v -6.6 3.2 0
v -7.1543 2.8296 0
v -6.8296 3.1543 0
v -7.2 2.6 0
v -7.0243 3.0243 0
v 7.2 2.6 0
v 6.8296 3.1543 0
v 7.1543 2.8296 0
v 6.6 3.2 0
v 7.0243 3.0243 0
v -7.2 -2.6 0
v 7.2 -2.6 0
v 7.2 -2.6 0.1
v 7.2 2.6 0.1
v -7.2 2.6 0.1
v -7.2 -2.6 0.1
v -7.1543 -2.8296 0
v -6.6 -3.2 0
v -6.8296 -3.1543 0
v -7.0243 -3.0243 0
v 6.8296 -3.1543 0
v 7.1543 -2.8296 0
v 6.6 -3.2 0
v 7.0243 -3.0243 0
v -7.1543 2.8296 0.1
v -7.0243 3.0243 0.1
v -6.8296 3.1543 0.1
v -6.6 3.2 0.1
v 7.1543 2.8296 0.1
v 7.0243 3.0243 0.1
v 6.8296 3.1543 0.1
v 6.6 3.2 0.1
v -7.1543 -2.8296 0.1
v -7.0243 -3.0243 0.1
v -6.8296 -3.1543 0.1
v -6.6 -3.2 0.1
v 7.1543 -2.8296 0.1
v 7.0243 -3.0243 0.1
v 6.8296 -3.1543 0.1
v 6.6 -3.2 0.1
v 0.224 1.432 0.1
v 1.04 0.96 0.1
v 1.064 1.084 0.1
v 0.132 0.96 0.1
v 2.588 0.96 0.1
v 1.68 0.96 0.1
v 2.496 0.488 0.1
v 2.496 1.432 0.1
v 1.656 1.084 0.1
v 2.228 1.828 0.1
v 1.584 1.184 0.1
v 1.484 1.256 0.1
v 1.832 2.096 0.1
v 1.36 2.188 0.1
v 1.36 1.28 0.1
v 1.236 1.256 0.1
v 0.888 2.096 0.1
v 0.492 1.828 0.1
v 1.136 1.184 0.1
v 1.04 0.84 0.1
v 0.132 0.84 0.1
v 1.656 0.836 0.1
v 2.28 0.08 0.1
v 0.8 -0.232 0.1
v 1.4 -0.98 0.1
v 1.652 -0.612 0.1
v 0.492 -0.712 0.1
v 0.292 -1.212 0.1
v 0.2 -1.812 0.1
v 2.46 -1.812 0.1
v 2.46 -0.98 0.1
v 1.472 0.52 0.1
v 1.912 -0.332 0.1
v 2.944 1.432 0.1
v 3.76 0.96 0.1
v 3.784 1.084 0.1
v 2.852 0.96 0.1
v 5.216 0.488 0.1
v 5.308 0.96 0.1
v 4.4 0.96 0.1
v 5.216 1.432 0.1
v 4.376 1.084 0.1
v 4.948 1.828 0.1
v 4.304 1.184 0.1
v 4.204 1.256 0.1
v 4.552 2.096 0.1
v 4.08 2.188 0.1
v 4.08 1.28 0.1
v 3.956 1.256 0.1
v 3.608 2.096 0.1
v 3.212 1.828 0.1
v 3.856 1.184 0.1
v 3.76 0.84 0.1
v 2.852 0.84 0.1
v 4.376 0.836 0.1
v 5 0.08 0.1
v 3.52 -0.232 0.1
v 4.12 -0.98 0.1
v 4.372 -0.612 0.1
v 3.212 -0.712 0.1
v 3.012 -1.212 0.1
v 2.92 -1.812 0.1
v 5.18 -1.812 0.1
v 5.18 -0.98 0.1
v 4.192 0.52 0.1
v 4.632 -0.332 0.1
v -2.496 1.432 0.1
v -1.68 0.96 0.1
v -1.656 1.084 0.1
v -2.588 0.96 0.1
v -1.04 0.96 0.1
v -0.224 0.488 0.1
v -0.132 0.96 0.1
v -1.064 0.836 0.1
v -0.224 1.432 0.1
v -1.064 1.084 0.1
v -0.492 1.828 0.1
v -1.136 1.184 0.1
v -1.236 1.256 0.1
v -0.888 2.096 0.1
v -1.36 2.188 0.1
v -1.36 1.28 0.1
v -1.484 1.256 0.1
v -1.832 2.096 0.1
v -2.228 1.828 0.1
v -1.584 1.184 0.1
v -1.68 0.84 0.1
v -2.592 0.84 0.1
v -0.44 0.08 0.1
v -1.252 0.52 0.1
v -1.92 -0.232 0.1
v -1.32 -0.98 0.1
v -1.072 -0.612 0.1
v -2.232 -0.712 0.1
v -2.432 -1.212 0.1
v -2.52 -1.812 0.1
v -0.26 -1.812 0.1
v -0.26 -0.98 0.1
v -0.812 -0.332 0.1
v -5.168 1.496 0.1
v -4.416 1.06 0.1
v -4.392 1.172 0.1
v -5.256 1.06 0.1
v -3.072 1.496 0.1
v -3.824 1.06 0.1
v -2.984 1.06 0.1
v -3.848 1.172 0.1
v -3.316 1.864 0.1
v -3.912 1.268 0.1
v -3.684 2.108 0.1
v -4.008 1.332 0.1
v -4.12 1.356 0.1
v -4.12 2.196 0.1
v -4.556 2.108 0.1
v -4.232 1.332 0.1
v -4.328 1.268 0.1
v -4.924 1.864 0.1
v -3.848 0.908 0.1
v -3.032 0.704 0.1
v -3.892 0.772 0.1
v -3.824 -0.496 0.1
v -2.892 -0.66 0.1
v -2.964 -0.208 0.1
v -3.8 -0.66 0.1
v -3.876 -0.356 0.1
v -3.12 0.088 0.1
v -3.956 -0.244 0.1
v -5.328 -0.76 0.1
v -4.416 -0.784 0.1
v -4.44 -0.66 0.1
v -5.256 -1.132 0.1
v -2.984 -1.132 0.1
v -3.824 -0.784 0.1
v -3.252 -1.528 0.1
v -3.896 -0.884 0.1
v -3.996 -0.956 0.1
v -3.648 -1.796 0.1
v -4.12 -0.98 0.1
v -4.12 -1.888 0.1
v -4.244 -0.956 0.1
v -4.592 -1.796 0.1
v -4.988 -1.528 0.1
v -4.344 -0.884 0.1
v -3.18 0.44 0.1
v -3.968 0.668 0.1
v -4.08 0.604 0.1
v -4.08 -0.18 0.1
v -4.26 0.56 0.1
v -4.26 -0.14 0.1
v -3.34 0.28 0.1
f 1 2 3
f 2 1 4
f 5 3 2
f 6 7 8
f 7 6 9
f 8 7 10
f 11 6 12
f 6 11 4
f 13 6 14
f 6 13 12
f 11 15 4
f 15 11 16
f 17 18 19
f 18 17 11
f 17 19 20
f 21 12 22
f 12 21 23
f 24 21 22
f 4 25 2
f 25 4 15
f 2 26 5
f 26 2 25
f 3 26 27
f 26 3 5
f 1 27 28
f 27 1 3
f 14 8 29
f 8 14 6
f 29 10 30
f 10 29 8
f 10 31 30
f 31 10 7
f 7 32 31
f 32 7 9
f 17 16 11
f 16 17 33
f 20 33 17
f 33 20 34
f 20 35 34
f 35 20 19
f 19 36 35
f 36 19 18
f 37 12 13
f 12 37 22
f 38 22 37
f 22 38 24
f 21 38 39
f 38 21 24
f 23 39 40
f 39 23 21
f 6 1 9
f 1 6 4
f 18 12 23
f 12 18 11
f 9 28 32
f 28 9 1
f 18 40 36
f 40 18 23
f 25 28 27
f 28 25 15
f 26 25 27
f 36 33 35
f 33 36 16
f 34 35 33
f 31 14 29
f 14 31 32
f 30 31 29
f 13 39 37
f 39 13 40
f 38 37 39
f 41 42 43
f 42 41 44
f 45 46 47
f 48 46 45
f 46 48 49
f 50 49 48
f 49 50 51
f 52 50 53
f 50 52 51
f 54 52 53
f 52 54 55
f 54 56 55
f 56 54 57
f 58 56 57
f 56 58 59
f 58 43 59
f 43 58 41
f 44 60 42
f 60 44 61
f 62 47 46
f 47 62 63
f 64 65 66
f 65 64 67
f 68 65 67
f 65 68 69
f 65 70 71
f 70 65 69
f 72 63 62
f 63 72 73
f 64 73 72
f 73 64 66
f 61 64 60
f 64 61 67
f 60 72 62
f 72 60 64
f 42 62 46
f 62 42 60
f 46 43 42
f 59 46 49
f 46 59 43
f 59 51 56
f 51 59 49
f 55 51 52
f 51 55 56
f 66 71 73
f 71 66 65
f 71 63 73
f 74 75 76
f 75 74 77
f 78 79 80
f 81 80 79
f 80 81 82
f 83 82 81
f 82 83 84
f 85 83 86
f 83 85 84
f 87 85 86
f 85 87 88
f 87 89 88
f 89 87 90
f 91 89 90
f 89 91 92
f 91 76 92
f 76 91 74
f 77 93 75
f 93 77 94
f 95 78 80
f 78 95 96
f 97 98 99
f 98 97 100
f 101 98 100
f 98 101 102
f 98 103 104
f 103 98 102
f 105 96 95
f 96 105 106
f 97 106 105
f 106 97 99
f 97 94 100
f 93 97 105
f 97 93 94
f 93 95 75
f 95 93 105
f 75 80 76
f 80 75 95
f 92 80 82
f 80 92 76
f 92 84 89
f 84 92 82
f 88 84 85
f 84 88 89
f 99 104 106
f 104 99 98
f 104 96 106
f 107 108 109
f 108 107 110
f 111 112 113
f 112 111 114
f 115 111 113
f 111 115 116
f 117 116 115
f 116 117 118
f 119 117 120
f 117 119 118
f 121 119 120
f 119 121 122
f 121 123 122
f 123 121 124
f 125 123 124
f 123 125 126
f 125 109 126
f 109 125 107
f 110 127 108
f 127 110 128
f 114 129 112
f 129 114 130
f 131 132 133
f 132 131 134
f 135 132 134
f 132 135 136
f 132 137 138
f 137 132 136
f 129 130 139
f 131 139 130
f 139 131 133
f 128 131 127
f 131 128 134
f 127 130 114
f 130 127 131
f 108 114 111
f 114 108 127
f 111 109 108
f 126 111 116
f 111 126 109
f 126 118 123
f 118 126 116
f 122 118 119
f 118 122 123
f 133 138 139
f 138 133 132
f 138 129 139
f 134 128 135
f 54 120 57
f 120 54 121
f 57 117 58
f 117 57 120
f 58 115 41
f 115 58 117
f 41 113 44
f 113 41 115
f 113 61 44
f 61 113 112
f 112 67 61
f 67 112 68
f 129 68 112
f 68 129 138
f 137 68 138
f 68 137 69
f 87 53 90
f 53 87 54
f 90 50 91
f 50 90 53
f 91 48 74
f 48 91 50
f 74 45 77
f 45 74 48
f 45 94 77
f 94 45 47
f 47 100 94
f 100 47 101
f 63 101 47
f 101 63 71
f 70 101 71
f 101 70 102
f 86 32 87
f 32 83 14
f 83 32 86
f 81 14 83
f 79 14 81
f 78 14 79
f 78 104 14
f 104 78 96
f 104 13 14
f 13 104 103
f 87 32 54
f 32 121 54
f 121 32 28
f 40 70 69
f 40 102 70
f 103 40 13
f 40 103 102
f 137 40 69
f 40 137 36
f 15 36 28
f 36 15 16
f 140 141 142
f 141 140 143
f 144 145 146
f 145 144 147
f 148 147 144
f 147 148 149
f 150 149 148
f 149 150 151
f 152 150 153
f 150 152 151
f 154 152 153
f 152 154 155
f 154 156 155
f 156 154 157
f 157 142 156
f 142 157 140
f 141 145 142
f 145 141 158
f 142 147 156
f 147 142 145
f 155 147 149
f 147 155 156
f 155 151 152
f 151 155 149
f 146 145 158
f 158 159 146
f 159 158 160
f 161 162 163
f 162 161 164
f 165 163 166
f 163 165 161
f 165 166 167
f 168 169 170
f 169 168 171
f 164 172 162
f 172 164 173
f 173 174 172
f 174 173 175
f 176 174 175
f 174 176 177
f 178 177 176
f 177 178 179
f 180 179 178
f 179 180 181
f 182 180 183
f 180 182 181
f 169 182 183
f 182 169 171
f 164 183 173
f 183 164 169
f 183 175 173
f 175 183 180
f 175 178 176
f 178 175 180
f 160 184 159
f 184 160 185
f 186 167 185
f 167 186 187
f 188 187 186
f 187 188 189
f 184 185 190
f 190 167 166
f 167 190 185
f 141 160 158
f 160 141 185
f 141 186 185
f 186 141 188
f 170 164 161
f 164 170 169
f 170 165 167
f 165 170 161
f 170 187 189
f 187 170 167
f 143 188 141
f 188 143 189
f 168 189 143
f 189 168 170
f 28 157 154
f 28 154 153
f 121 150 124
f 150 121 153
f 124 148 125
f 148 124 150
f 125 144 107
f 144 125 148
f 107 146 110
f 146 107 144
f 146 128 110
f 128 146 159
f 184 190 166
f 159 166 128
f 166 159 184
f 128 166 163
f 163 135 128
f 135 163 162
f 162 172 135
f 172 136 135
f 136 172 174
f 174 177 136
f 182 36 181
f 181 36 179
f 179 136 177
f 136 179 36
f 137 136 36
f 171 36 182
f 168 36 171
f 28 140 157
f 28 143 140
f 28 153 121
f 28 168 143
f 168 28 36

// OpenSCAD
// file: ../p/box3u12.scad
use <../lib.scad>
function ldraw_lib__box3u12() = [
// 0 Box with 3 Parallel Faces without Any Edges
// 0 Name: box3u12.dat
// 0 Author: J.C. Tchang [tchang]
// 0 !LDRAW_ORG Primitive UPDATE 2014-02
// 0 !LICENSE Licensed under CC BY 4.0 : see CAreadme.txt
// 
// 0 BFC CERTIFY CCW
  [0,"BFC","CERTIFY"],
  [0,"BFC","CCW"],
// 
// 0 !HISTORY 2014-12-23 [PTadmin] Official Update 2014-02
// 
// 
// 4 16 -1 1 1 1 1 1 1 1 -1 -1 1 -1
  [4,16,-1,1,1,1,1,1,1,1,-1,-1,1,-1],
// 4 16 -1 1 1 -1 0 1 1 0 1 1 1 1
  [4,16,-1,1,1,-1,0,1,1,0,1,1,1,1],
// 4 16 1 1 -1 1 0 -1 -1 0 -1 -1 1 -1
  [4,16,1,1,-1,1,0,-1,-1,0,-1,-1,1,-1],
];
module ldraw_lib__box3u12(step=0, col=false, unit=2/5, alt=false, line=0.2, solid=!$preview)
    makepoly(ldraw_lib__box3u12(), step=step, col=col, unit=unit, alt=alt, line=line, solid=solid);
ldraw_lib__box3u12(line=0.2);
// file: ../p/1-4cyli.scad
use <../lib.scad>
function ldraw_lib__1_4cyli() = [
// 0 Cylinder 0.25
// 0 Name: 1-4cyli.dat
// 0 Author: James Jessiman
// 0 !LDRAW_ORG Primitive UPDATE 2012-01
// 0 !LICENSE Licensed under CC BY 4.0 : see CAreadme.txt
// 
// 0 BFC CERTIFY CCW
  [0,"BFC","CERTIFY"],
  [0,"BFC","CCW"],
// 
// 0 !HISTORY 2002-03-23 [sbliss] Added BFC statement.
// 0 !HISTORY 2002-04-25 [PTadmin] Official Update 2002-02
// 0 !HISTORY 2007-06-22 [PTadmin] Header formatted for Contributor Agreement
// 0 !HISTORY 2008-07-01 [PTadmin] Official Update 2008-01
// 0 !HISTORY 2012-02-16 [Philo] Changed to CCW
// 0 !HISTORY 2012-03-30 [PTadmin] Official Update 2012-01
// 
// 
// 4 16 1 1 0 0.9239 1 0.3827 0.9239 0 0.3827 1 0 0
  [4,16,1,1,0,0.9239,1,0.3827,0.9239,0,0.3827,1,0,0],
// 5 24 1 0 0 1 1 0 0.9239 0 0.3827 1 0 -1
  [5,24,1,0,0,1,1,0,0.9239,0,0.3827,1,0,-1],
// 4 16 0.9239 1 0.3827 0.7071 1 0.7071 0.7071 0 0.7071 0.9239 0 0.3827
  [4,16,0.9239,1,0.3827,0.7071,1,0.7071,0.7071,0,0.7071,0.9239,0,0.3827],
// 5 24 0.9239 0 0.3827 0.9239 1 0.3827 0.7071 0 0.7071 1 0 0
  [5,24,0.9239,0,0.3827,0.9239,1,0.3827,0.7071,0,0.7071,1,0,0],
// 4 16 0.7071 1 0.7071 0.3827 1 0.9239 0.3827 0 0.9239 0.7071 0 0.7071
  [4,16,0.7071,1,0.7071,0.3827,1,0.9239,0.3827,0,0.9239,0.7071,0,0.7071],
// 5 24 0.7071 0 0.7071 0.7071 1 0.7071 0.3827 0 0.9239 0.9239 0 0.3827
  [5,24,0.7071,0,0.7071,0.7071,1,0.7071,0.3827,0,0.9239,0.9239,0,0.3827],
// 4 16 0.3827 1 0.9239 0 1 1 0 0 1 0.3827 0 0.9239
  [4,16,0.3827,1,0.9239,0,1,1,0,0,1,0.3827,0,0.9239],
// 5 24 0.3827 0 0.9239 0.3827 1 0.9239 0 0 1 0.7071 0 0.7071
  [5,24,0.3827,0,0.9239,0.3827,1,0.9239,0,0,1,0.7071,0,0.7071],
// 5 24 0 0 1 0 1 1 0.3827 0 0.9239 -1 0 1
  [5,24,0,0,1,0,1,1,0.3827,0,0.9239,-1,0,1],
];
module ldraw_lib__1_4cyli(step=0, col=false, unit=2/5, alt=false, line=0.2, solid=!$preview)
    makepoly(ldraw_lib__1_4cyli(), step=step, col=col, unit=unit, alt=alt, line=line, solid=solid);
ldraw_lib__1_4cyli(line=0.2);
// file: s/stickerback008x018.scad
use <../../lib.scad>
use <../../p/1-4chrd.scad>
use <../../p/1-4cyli.scad>
use <../../p/box3u12.scad>
function ldraw_lib__s__stickerback008x018() = [
// 0 ~Sticker Back  0.8 x  1.8
// 0 Name: s\stickerback008x018.dat
// 0 Author: Massimo Maso [Sirio]
// 0 !LDRAW_ORG Subpart UPDATE 2025-08
// 0 !LICENSE Licensed under CC BY 4.0 : see CAreadme.txt
// 
// 0 BFC CERTIFY CCW
  [0,"BFC","CERTIFY"],
  [0,"BFC","CCW"],
// 
// 0 !HISTORY 2025-08-31 [OrionP] Official Update 2025-08
// 
// 0 // Primitives
// 1 16 -16.5 0 6.5 -1.5 0 0 0 -1 0 0 0 1.5 1-4chrd.dat
  [1,16,-16.5,0,6.5,-1.5,0,0,0,-1,0,0,0,1.5, ldraw_lib__1_4chrd()],
// 1 16 16.5 0 6.5 1.5 0 0 0 -1 0 0 0 1.5 1-4chrd.dat
  [1,16,16.5,0,6.5,1.5,0,0,0,-1,0,0,0,1.5, ldraw_lib__1_4chrd()],
// 1 16 0 -.25 0 0 0 18 0 .25 0 6.5 0 0 box3u12.dat
  [1,16,0,-.25,0,0,0,18,0,.25,0,6.5,0,0, ldraw_lib__box3u12()],
// 1 16 -16.5 0 -6.5 -1.5 0 0 0 -1 0 0 0 -1.5 1-4chrd.dat
  [1,16,-16.5,0,-6.5,-1.5,0,0,0,-1,0,0,0,-1.5, ldraw_lib__1_4chrd()],
// 1 16 16.5 0 -6.5 1.5 0 0 0 -1 0 0 0 -1.5 1-4chrd.dat
  [1,16,16.5,0,-6.5,1.5,0,0,0,-1,0,0,0,-1.5, ldraw_lib__1_4chrd()],
// 1 16 -16.5 0 6.5 -1.5 0 0 0 -.25 0 0 0 1.5 1-4cyli.dat
  [1,16,-16.5,0,6.5,-1.5,0,0,0,-.25,0,0,0,1.5, ldraw_lib__1_4cyli()],
// 1 16 16.5 0 6.5 1.5 0 0 0 -.25 0 0 0 1.5 1-4cyli.dat
  [1,16,16.5,0,6.5,1.5,0,0,0,-.25,0,0,0,1.5, ldraw_lib__1_4cyli()],
// 1 16 -16.5 0 -6.5 -1.5 0 0 0 -.25 0 0 0 -1.5 1-4cyli.dat
  [1,16,-16.5,0,-6.5,-1.5,0,0,0,-.25,0,0,0,-1.5, ldraw_lib__1_4cyli()],
// 1 16 16.5 0 -6.5 1.5 0 0 0 -.25 0 0 0 -1.5 1-4cyli.dat
  [1,16,16.5,0,-6.5,1.5,0,0,0,-.25,0,0,0,-1.5, ldraw_lib__1_4cyli()],
// 0 // Bottom face
// 4 16 -18 0 6.5 -16.5 0 8 16.5 0 8 18 0 6.5
  [4,16,-18,0,6.5,-16.5,0,8,16.5,0,8,18,0,6.5],
// 4 16 -18 0 -6.5 18 0 -6.5 16.5 0 -8 -16.5 0 -8
  [4,16,-18,0,-6.5,18,0,-6.5,16.5,0,-8,-16.5,0,-8],
// 0 // Lateral face
// 4 16 -16.5 0 8 -16.5 -.25 8 16.5 -.25 8 16.5 0 8
  [4,16,-16.5,0,8,-16.5,-.25,8,16.5,-.25,8,16.5,0,8],
// 4 16 -16.5 0 -8 16.5 0 -8 16.5 -.25 -8 -16.5 -.25 -8
  [4,16,-16.5,0,-8,16.5,0,-8,16.5,-.25,-8,-16.5,-.25,-8],
];
module ldraw_lib__s__stickerback008x018(step=0, col=false, unit=2/5, alt=false, line=0.2, solid=!$preview)
    makepoly(ldraw_lib__s__stickerback008x018(), step=step, col=col, unit=unit, alt=alt, line=line, solid=solid);
ldraw_lib__s__stickerback008x018(line=0.2);
// file: ../p/1-4chrd.scad
use <../lib.scad>
function ldraw_lib__1_4chrd() = [
// 0 Chord 0.25
// 0 Name: 1-4chrd.dat
// 0 Author: Max Martin Richter [MMR1988]
// 0 !LDRAW_ORG Primitive UPDATE 2023-05
// 0 !LICENSE Licensed under CC BY 4.0 : see CAreadme.txt
// 
// 0 BFC CERTIFY CCW
  [0,"BFC","CERTIFY"],
  [0,"BFC","CCW"],
// 
// 0 !HISTORY 2004-04-22 [PTadmin] Official Update 2004-02
// 0 !HISTORY 2007-10-09 [PTadmin] Header formatted for Contributor Agreement
// 0 !HISTORY 2008-07-01 [PTadmin] Official Update 2008-01
// 0 !HISTORY 2012-08-02 [MMR1988] Re-creation with PrimGen2 and Rectifier
// 0 !HISTORY 2012-08-09 [PTadmin] Official Update 2012-02
// 0 !HISTORY 2023-10-27 [OrionP] Change author to MMR1988 from hafhead
// 0 !HISTORY 2023-10-31 [OrionP] Official Update 2023-05
// 
// 4 16 0.9239 0 0.3827 0.3827 0 0.9239 0 0 1 1 0 0
  [4,16,0.9239,0,0.3827,0.3827,0,0.9239,0,0,1,1,0,0],
// 3 16 0.7071 0 0.7071 0.3827 0 0.9239 0.9239 0 0.3827
  [3,16,0.7071,0,0.7071,0.3827,0,0.9239,0.9239,0,0.3827],
];
module ldraw_lib__1_4chrd(step=0, col=false, unit=2/5, alt=false, line=0.2, solid=!$preview)
    makepoly(ldraw_lib__1_4chrd(), step=step, col=col, unit=unit, alt=alt, line=line, solid=solid);
ldraw_lib__1_4chrd(line=0.2);
// main file
use <../lib.scad>
use <../p/1-4chrd.scad>
use <s/stickerback008x018.scad>
function ldraw_lib__4578235a() = [
// 0 Sticker  0.8 x  1.8 with White "3222" on Blue Background
// 0 Name: 4578235a.dat
// 0 Author: Evert-Jan Boer [ejboer]
// 0 !LDRAW_ORG Part UPDATE 2026-07
// 0 !LICENSE Licensed under CC BY 4.0 : see CAreadme.txt
// 
// 0 BFC CERTIFY CCW
  [0,"BFC","CERTIFY"],
  [0,"BFC","CCW"],
// 
// 0 !CATEGORY Sticker
// 0 !KEYWORDS Bricklink 3222stk01, Brickowl 305996, Helicopter and Limousine
// 0 !KEYWORDS Rebrickable 89505, Set 3222
// 
// 0 !HISTORY 2026-07-30 [OrionP] Official Update 2026-07
// 
// 1 16 0 0 0 1 0 0 0 1 0 0 0 1 s\stickerback008x018.dat
  [1,16,0,0,0,1,0,0,0,1,0,0,0,1, ldraw_lib__s__stickerback008x018()],
// 1 1 -16.5 -0.25 6.5 0 0 -1.5 0 1 0 1.5 0 0 1-4chrd.dat
  [1,1,-16.5,-0.25,6.5,0,0,-1.5,0,1,0,1.5,0,0, ldraw_lib__1_4chrd()],
// 1 1 -16.5 -0.25 -6.5 -1.5 0 0 0 1 0 0 0 -1.5 1-4chrd.dat
  [1,1,-16.5,-0.25,-6.5,-1.5,0,0,0,1,0,0,0,-1.5, ldraw_lib__1_4chrd()],
// 1 1 16.5 -0.25 6.5 1.5 0 0 0 1 0 0 0 1.5 1-4chrd.dat
  [1,1,16.5,-0.25,6.5,1.5,0,0,0,1,0,0,0,1.5, ldraw_lib__1_4chrd()],
// 1 1 16.5 -0.25 -6.5 0 0 1.5 0 1 0 -1.5 0 0 1-4chrd.dat
  [1,1,16.5,-0.25,-6.5,0,0,1.5,0,1,0,-1.5,0,0, ldraw_lib__1_4chrd()],
// 4 15 2.66 -0.25 2.71 0.56 -0.25 3.58 0.33 -0.25 2.4 2.6 -0.25 2.4
  [4,15,2.66,-0.25,2.71,0.56,-0.25,3.58,0.33,-0.25,2.4,2.6,-0.25,2.4],
// 3 15 6.47 -0.25 2.4 4.2 -0.25 2.4 6.24 -0.25 1.22
  [3,15,6.47,-0.25,2.4,4.2,-0.25,2.4,6.24,-0.25,1.22],
// 4 15 6.24 -0.25 3.58 4.14 -0.25 2.71 4.2 -0.25 2.4 6.47 -0.25 2.4
  [4,15,6.24,-0.25,3.58,4.14,-0.25,2.71,4.2,-0.25,2.4,6.47,-0.25,2.4],
// 4 15 4.14 -0.25 2.71 6.24 -0.25 3.58 5.57 -0.25 4.57 3.96 -0.25 2.96
  [4,15,4.14,-0.25,2.71,6.24,-0.25,3.58,5.57,-0.25,4.57,3.96,-0.25,2.96],
// 4 15 3.96 -0.25 2.96 5.57 -0.25 4.57 4.58 -0.25 5.24 3.71 -0.25 3.14
  [4,15,3.96,-0.25,2.96,5.57,-0.25,4.57,4.58,-0.25,5.24,3.71,-0.25,3.14],
// 4 15 3.71 -0.25 3.14 4.58 -0.25 5.24 3.4 -0.25 5.47 3.4 -0.25 3.2
  [4,15,3.71,-0.25,3.14,4.58,-0.25,5.24,3.4,-0.25,5.47,3.4,-0.25,3.2],
// 4 15 3.4 -0.25 3.2 3.4 -0.25 5.47 2.22 -0.25 5.24 3.09 -0.25 3.14
  [4,15,3.4,-0.25,3.2,3.4,-0.25,5.47,2.22,-0.25,5.24,3.09,-0.25,3.14],
// 4 15 3.09 -0.25 3.14 2.22 -0.25 5.24 1.23 -0.25 4.57 2.84 -0.25 2.96
  [4,15,3.09,-0.25,3.14,2.22,-0.25,5.24,1.23,-0.25,4.57,2.84,-0.25,2.96],
// 4 15 0.56 -0.25 3.58 2.66 -0.25 2.71 2.84 -0.25 2.96 1.23 -0.25 4.57
  [4,15,0.56,-0.25,3.58,2.66,-0.25,2.71,2.84,-0.25,2.96,1.23,-0.25,4.57],
// 4 15 2.6 -0.25 2.1 2.6 -0.25 2.4 0.33 -0.25 2.4 0.33 -0.25 2.1
  [4,15,2.6,-0.25,2.1,2.6,-0.25,2.4,0.33,-0.25,2.4,0.33,-0.25,2.1],
// 4 15 4.2 -0.25 2.4 4.14 -0.25 2.09 5.7 -0.25 0.2 6.24 -0.25 1.22
  [4,15,4.2,-0.25,2.4,4.14,-0.25,2.09,5.7,-0.25,0.2,6.24,-0.25,1.22],
// 4 15 2 -0.25 -0.58 1.23 -0.25 -1.78 3.5 -0.25 -2.45 4.13 -0.25 -1.53
  [4,15,2,-0.25,-0.58,1.23,-0.25,-1.78,3.5,-0.25,-2.45,4.13,-0.25,-1.53],
// 4 15 0.5 -0.25 -4.53 3.5 -0.25 -2.45 1.23 -0.25 -1.78 0.73 -0.25 -3.03
  [4,15,0.5,-0.25,-4.53,3.5,-0.25,-2.45,1.23,-0.25,-1.78,0.73,-0.25,-3.03],
// 4 15 0.5 -0.25 -4.53 6.15 -0.25 -4.53 6.15 -0.25 -2.45 3.5 -0.25 -2.45
  [4,15,0.5,-0.25,-4.53,6.15,-0.25,-4.53,6.15,-0.25,-2.45,3.5,-0.25,-2.45],
// 4 15 4.14 -0.25 2.09 3.68 -0.25 1.3 4.78 -0.25 -0.83 5.7 -0.25 0.2
  [4,15,4.14,-0.25,2.09,3.68,-0.25,1.3,4.78,-0.25,-0.83,5.7,-0.25,0.2],
// 4 15 2 -0.25 -0.58 4.13 -0.25 -1.53 4.78 -0.25 -0.83 3.68 -0.25 1.3
  [4,15,2,-0.25,-0.58,4.13,-0.25,-1.53,4.78,-0.25,-0.83,3.68,-0.25,1.3],
// 4 1 2.6 -0.25 2.1 0.33 -0.25 2.1 1.23 -0.25 -1.78 2 -0.25 -0.58
  [4,1,2.6,-0.25,2.1,0.33,-0.25,2.1,1.23,-0.25,-1.78,2,-0.25,-0.58],
// 4 1 2 -0.25 -0.58 3.68 -0.25 1.3 4.14 -0.25 2.09 2.6 -0.25 2.1
  [4,1,2,-0.25,-0.58,3.68,-0.25,1.3,4.14,-0.25,2.09,2.6,-0.25,2.1],
// 4 1 2.6 -0.25 2.1 4.14 -0.25 2.09 4.2 -0.25 2.4 2.6 -0.25 2.4
  [4,1,2.6,-0.25,2.1,4.14,-0.25,2.09,4.2,-0.25,2.4,2.6,-0.25,2.4],
// 3 1 4.2 -0.25 2.4 2.66 -0.25 2.71 2.6 -0.25 2.4
  [3,1,4.2,-0.25,2.4,2.66,-0.25,2.71,2.6,-0.25,2.4],
// 4 1 4.2 -0.25 2.4 4.14 -0.25 2.71 2.84 -0.25 2.96 2.66 -0.25 2.71
  [4,1,4.2,-0.25,2.4,4.14,-0.25,2.71,2.84,-0.25,2.96,2.66,-0.25,2.71],
// 4 1 4.14 -0.25 2.71 3.96 -0.25 2.96 3.09 -0.25 3.14 2.84 -0.25 2.96
  [4,1,4.14,-0.25,2.71,3.96,-0.25,2.96,3.09,-0.25,3.14,2.84,-0.25,2.96],
// 4 1 3.96 -0.25 2.96 3.71 -0.25 3.14 3.4 -0.25 3.2 3.09 -0.25 3.14
  [4,1,3.96,-0.25,2.96,3.71,-0.25,3.14,3.4,-0.25,3.2,3.09,-0.25,3.14],
// 4 1 3.5 -0.25 -2.45 6.15 -0.25 -2.45 4.78 -0.25 -0.83 4.13 -0.25 -1.53
  [4,1,3.5,-0.25,-2.45,6.15,-0.25,-2.45,4.78,-0.25,-0.83,4.13,-0.25,-1.53],
// 3 1 6.15 -0.25 -2.45 5.7 -0.25 0.2 4.78 -0.25 -0.83
  [3,1,6.15,-0.25,-2.45,5.7,-0.25,0.2,4.78,-0.25,-0.83],
// 4 15 9.46 -0.25 2.71 7.36 -0.25 3.58 7.13 -0.25 2.4 9.4 -0.25 2.4
  [4,15,9.46,-0.25,2.71,7.36,-0.25,3.58,7.13,-0.25,2.4,9.4,-0.25,2.4],
// 3 15 13.04 -0.25 1.22 13.27 -0.25 2.4 11 -0.25 2.4
  [3,15,13.04,-0.25,1.22,13.27,-0.25,2.4,11,-0.25,2.4],
// 4 15 13.04 -0.25 3.58 10.94 -0.25 2.71 11 -0.25 2.4 13.27 -0.25 2.4
  [4,15,13.04,-0.25,3.58,10.94,-0.25,2.71,11,-0.25,2.4,13.27,-0.25,2.4],
// 4 15 12.37 -0.25 4.57 10.76 -0.25 2.96 10.94 -0.25 2.71 13.04 -0.25 3.58
  [4,15,12.37,-0.25,4.57,10.76,-0.25,2.96,10.94,-0.25,2.71,13.04,-0.25,3.58],
// 4 15 10.76 -0.25 2.96 12.37 -0.25 4.57 11.38 -0.25 5.24 10.51 -0.25 3.14
  [4,15,10.76,-0.25,2.96,12.37,-0.25,4.57,11.38,-0.25,5.24,10.51,-0.25,3.14],
// 4 15 10.51 -0.25 3.14 11.38 -0.25 5.24 10.2 -0.25 5.47 10.2 -0.25 3.2
  [4,15,10.51,-0.25,3.14,11.38,-0.25,5.24,10.2,-0.25,5.47,10.2,-0.25,3.2],
// 4 15 9.02 -0.25 5.24 9.89 -0.25 3.14 10.2 -0.25 3.2 10.2 -0.25 5.47
  [4,15,9.02,-0.25,5.24,9.89,-0.25,3.14,10.2,-0.25,3.2,10.2,-0.25,5.47],
// 4 15 9.89 -0.25 3.14 9.02 -0.25 5.24 8.03 -0.25 4.57 9.64 -0.25 2.96
  [4,15,9.89,-0.25,3.14,9.02,-0.25,5.24,8.03,-0.25,4.57,9.64,-0.25,2.96],
// 4 15 7.36 -0.25 3.58 9.46 -0.25 2.71 9.64 -0.25 2.96 8.03 -0.25 4.57
  [4,15,7.36,-0.25,3.58,9.46,-0.25,2.71,9.64,-0.25,2.96,8.03,-0.25,4.57],
// 4 15 9.4 -0.25 2.1 9.4 -0.25 2.4 7.13 -0.25 2.4 7.13 -0.25 2.1
  [4,15,9.4,-0.25,2.1,9.4,-0.25,2.4,7.13,-0.25,2.4,7.13,-0.25,2.1],
// 4 15 11 -0.25 2.4 10.94 -0.25 2.09 12.5 -0.25 0.2 13.04 -0.25 1.22
  [4,15,11,-0.25,2.4,10.94,-0.25,2.09,12.5,-0.25,0.2,13.04,-0.25,1.22],
// 4 15 8.8 -0.25 -0.58 8.03 -0.25 -1.78 10.3 -0.25 -2.45 10.93 -0.25 -1.53
  [4,15,8.8,-0.25,-0.58,8.03,-0.25,-1.78,10.3,-0.25,-2.45,10.93,-0.25,-1.53],
// 4 15 7.3 -0.25 -4.53 10.3 -0.25 -2.45 8.03 -0.25 -1.78 7.53 -0.25 -3.03
  [4,15,7.3,-0.25,-4.53,10.3,-0.25,-2.45,8.03,-0.25,-1.78,7.53,-0.25,-3.03],
// 4 15 12.95 -0.25 -2.45 10.3 -0.25 -2.45 7.3 -0.25 -4.53 12.95 -0.25 -4.53
  [4,15,12.95,-0.25,-2.45,10.3,-0.25,-2.45,7.3,-0.25,-4.53,12.95,-0.25,-4.53],
// 4 15 10.94 -0.25 2.09 10.48 -0.25 1.3 11.58 -0.25 -0.83 12.5 -0.25 0.2
  [4,15,10.94,-0.25,2.09,10.48,-0.25,1.3,11.58,-0.25,-0.83,12.5,-0.25,0.2],
// 4 15 8.8 -0.25 -0.58 10.93 -0.25 -1.53 11.58 -0.25 -0.83 10.48 -0.25 1.3
  [4,15,8.8,-0.25,-0.58,10.93,-0.25,-1.53,11.58,-0.25,-0.83,10.48,-0.25,1.3],
// 3 1 8.8 -0.25 -0.58 7.13 -0.25 2.1 8.03 -0.25 -1.78
  [3,1,8.8,-0.25,-0.58,7.13,-0.25,2.1,8.03,-0.25,-1.78],
// 4 1 10.48 -0.25 1.3 9.4 -0.25 2.1 7.13 -0.25 2.1 8.8 -0.25 -0.58
  [4,1,10.48,-0.25,1.3,9.4,-0.25,2.1,7.13,-0.25,2.1,8.8,-0.25,-0.58],
// 4 1 9.4 -0.25 2.4 9.4 -0.25 2.1 10.48 -0.25 1.3 10.94 -0.25 2.09
  [4,1,9.4,-0.25,2.4,9.4,-0.25,2.1,10.48,-0.25,1.3,10.94,-0.25,2.09],
// 4 1 9.46 -0.25 2.71 9.4 -0.25 2.4 10.94 -0.25 2.09 11 -0.25 2.4
  [4,1,9.46,-0.25,2.71,9.4,-0.25,2.4,10.94,-0.25,2.09,11,-0.25,2.4],
// 4 1 9.64 -0.25 2.96 9.46 -0.25 2.71 11 -0.25 2.4 10.94 -0.25 2.71
  [4,1,9.64,-0.25,2.96,9.46,-0.25,2.71,11,-0.25,2.4,10.94,-0.25,2.71],
// 4 1 9.89 -0.25 3.14 9.64 -0.25 2.96 10.94 -0.25 2.71 10.76 -0.25 2.96
  [4,1,9.89,-0.25,3.14,9.64,-0.25,2.96,10.94,-0.25,2.71,10.76,-0.25,2.96],
// 4 1 10.76 -0.25 2.96 10.51 -0.25 3.14 10.2 -0.25 3.2 9.89 -0.25 3.14
  [4,1,10.76,-0.25,2.96,10.51,-0.25,3.14,10.2,-0.25,3.2,9.89,-0.25,3.14],
// 4 1 10.3 -0.25 -2.45 12.95 -0.25 -2.45 11.58 -0.25 -0.83 10.93 -0.25 -1.53
  [4,1,10.3,-0.25,-2.45,12.95,-0.25,-2.45,11.58,-0.25,-0.83,10.93,-0.25,-1.53],
// 3 1 12.95 -0.25 -2.45 12.5 -0.25 0.2 11.58 -0.25 -0.83
  [3,1,12.95,-0.25,-2.45,12.5,-0.25,0.2,11.58,-0.25,-0.83],
// 4 15 -4.14 -0.25 2.71 -6.24 -0.25 3.58 -6.47 -0.25 2.4 -4.2 -0.25 2.4
  [4,15,-4.14,-0.25,2.71,-6.24,-0.25,3.58,-6.47,-0.25,2.4,-4.2,-0.25,2.4],
// 4 15 -2.66 -0.25 2.09 -0.56 -0.25 1.22 -0.33 -0.25 2.4 -2.6 -0.25 2.4
  [4,15,-2.66,-0.25,2.09,-0.56,-0.25,1.22,-0.33,-0.25,2.4,-2.6,-0.25,2.4],
// 4 15 -2.6 -0.25 2.4 -0.33 -0.25 2.4 -0.56 -0.25 3.58 -2.66 -0.25 2.71
  [4,15,-2.6,-0.25,2.4,-0.33,-0.25,2.4,-0.56,-0.25,3.58,-2.66,-0.25,2.71],
// 4 15 -2.66 -0.25 2.71 -0.56 -0.25 3.58 -1.23 -0.25 4.57 -2.84 -0.25 2.96
  [4,15,-2.66,-0.25,2.71,-0.56,-0.25,3.58,-1.23,-0.25,4.57,-2.84,-0.25,2.96],
// 4 15 -2.84 -0.25 2.96 -1.23 -0.25 4.57 -2.22 -0.25 5.24 -3.09 -0.25 3.14
  [4,15,-2.84,-0.25,2.96,-1.23,-0.25,4.57,-2.22,-0.25,5.24,-3.09,-0.25,3.14],
// 4 15 -3.09 -0.25 3.14 -2.22 -0.25 5.24 -3.4 -0.25 5.47 -3.4 -0.25 3.2
  [4,15,-3.09,-0.25,3.14,-2.22,-0.25,5.24,-3.4,-0.25,5.47,-3.4,-0.25,3.2],
// 4 15 -3.4 -0.25 3.2 -3.4 -0.25 5.47 -4.58 -0.25 5.24 -3.71 -0.25 3.14
  [4,15,-3.4,-0.25,3.2,-3.4,-0.25,5.47,-4.58,-0.25,5.24,-3.71,-0.25,3.14],
// 4 15 -3.71 -0.25 3.14 -4.58 -0.25 5.24 -5.57 -0.25 4.57 -3.96 -0.25 2.96
  [4,15,-3.71,-0.25,3.14,-4.58,-0.25,5.24,-5.57,-0.25,4.57,-3.96,-0.25,2.96],
// 4 15 -3.96 -0.25 2.96 -5.57 -0.25 4.57 -6.24 -0.25 3.58 -4.14 -0.25 2.71
  [4,15,-3.96,-0.25,2.96,-5.57,-0.25,4.57,-6.24,-0.25,3.58,-4.14,-0.25,2.71],
// 4 15 -6.47 -0.25 2.4 -6.48 -0.25 2.1 -4.2 -0.25 2.1 -4.2 -0.25 2.4
  [4,15,-6.47,-0.25,2.4,-6.48,-0.25,2.1,-4.2,-0.25,2.1,-4.2,-0.25,2.4],
// 4 15 -0.56 -0.25 1.22 -2.66 -0.25 2.09 -3.13 -0.25 1.3 -1.1 -0.25 0.2
  [4,15,-0.56,-0.25,1.22,-2.66,-0.25,2.09,-3.13,-0.25,1.3,-1.1,-0.25,0.2],
// 4 15 -3.3 -0.25 -2.45 -2.68 -0.25 -1.53 -4.8 -0.25 -0.58 -5.58 -0.25 -1.78
  [4,15,-3.3,-0.25,-2.45,-2.68,-0.25,-1.53,-4.8,-0.25,-0.58,-5.58,-0.25,-1.78],
// 4 15 -5.58 -0.25 -1.78 -6.08 -0.25 -3.03 -6.3 -0.25 -4.53 -3.3 -0.25 -2.45
  [4,15,-5.58,-0.25,-1.78,-6.08,-0.25,-3.03,-6.3,-0.25,-4.53,-3.3,-0.25,-2.45],
// 4 15 -0.65 -0.25 -2.45 -3.3 -0.25 -2.45 -6.3 -0.25 -4.53 -0.65 -0.25 -4.53
  [4,15,-0.65,-0.25,-2.45,-3.3,-0.25,-2.45,-6.3,-0.25,-4.53,-0.65,-0.25,-4.53],
// 3 15 -1.1 -0.25 0.2 -3.13 -0.25 1.3 -2.03 -0.25 -0.83
  [3,15,-1.1,-0.25,0.2,-3.13,-0.25,1.3,-2.03,-0.25,-0.83],
// 4 15 -4.8 -0.25 -0.58 -2.68 -0.25 -1.53 -2.03 -0.25 -0.83 -3.13 -0.25 1.3
  [4,15,-4.8,-0.25,-0.58,-2.68,-0.25,-1.53,-2.03,-0.25,-0.83,-3.13,-0.25,1.3],
// 4 1 -5.58 -0.25 -1.78 -4.8 -0.25 -0.58 -4.2 -0.25 2.1 -6.48 -0.25 2.1
  [4,1,-5.58,-0.25,-1.78,-4.8,-0.25,-0.58,-4.2,-0.25,2.1,-6.48,-0.25,2.1],
// 4 1 -4.8 -0.25 -0.58 -3.13 -0.25 1.3 -2.66 -0.25 2.09 -4.2 -0.25 2.1
  [4,1,-4.8,-0.25,-0.58,-3.13,-0.25,1.3,-2.66,-0.25,2.09,-4.2,-0.25,2.1],
// 4 1 -4.2 -0.25 2.1 -2.66 -0.25 2.09 -2.6 -0.25 2.4 -4.2 -0.25 2.4
  [4,1,-4.2,-0.25,2.1,-2.66,-0.25,2.09,-2.6,-0.25,2.4,-4.2,-0.25,2.4],
// 3 1 -2.6 -0.25 2.4 -4.14 -0.25 2.71 -4.2 -0.25 2.4
  [3,1,-2.6,-0.25,2.4,-4.14,-0.25,2.71,-4.2,-0.25,2.4],
// 4 1 -2.6 -0.25 2.4 -2.66 -0.25 2.71 -3.96 -0.25 2.96 -4.14 -0.25 2.71
  [4,1,-2.6,-0.25,2.4,-2.66,-0.25,2.71,-3.96,-0.25,2.96,-4.14,-0.25,2.71],
// 4 1 -2.66 -0.25 2.71 -2.84 -0.25 2.96 -3.71 -0.25 3.14 -3.96 -0.25 2.96
  [4,1,-2.66,-0.25,2.71,-2.84,-0.25,2.96,-3.71,-0.25,3.14,-3.96,-0.25,2.96],
// 4 1 -3.4 -0.25 3.2 -3.71 -0.25 3.14 -2.84 -0.25 2.96 -3.09 -0.25 3.14
  [4,1,-3.4,-0.25,3.2,-3.71,-0.25,3.14,-2.84,-0.25,2.96,-3.09,-0.25,3.14],
// 4 1 -2.03 -0.25 -0.83 -2.68 -0.25 -1.53 -3.3 -0.25 -2.45 -0.65 -0.25 -2.45
  [4,1,-2.03,-0.25,-0.83,-2.68,-0.25,-1.53,-3.3,-0.25,-2.45,-0.65,-0.25,-2.45],
// 3 1 -0.65 -0.25 -2.45 -1.1 -0.25 0.2 -2.03 -0.25 -0.83
  [3,1,-0.65,-0.25,-2.45,-1.1,-0.25,0.2,-2.03,-0.25,-0.83],
// 3 1 -5.58 -0.25 -1.78 -6.48 -0.25 2.1 -6.08 -0.25 -3.03
  [3,1,-5.58,-0.25,-1.78,-6.48,-0.25,2.1,-6.08,-0.25,-3.03],
// 4 1 3.4 -0.25 5.47 -3.4 -0.25 5.47 -2.22 -0.25 5.24 2.22 -0.25 5.24
  [4,1,3.4,-0.25,5.47,-3.4,-0.25,5.47,-2.22,-0.25,5.24,2.22,-0.25,5.24],
// 4 1 -1.23 -0.25 4.57 1.23 -0.25 4.57 2.22 -0.25 5.24 -2.22 -0.25 5.24
  [4,1,-1.23,-0.25,4.57,1.23,-0.25,4.57,2.22,-0.25,5.24,-2.22,-0.25,5.24],
// 4 1 1.23 -0.25 4.57 -1.23 -0.25 4.57 -0.56 -0.25 3.58 0.56 -0.25 3.58
  [4,1,1.23,-0.25,4.57,-1.23,-0.25,4.57,-0.56,-0.25,3.58,0.56,-0.25,3.58],
// 4 1 0.56 -0.25 3.58 -0.56 -0.25 3.58 -0.33 -0.25 2.4 0.33 -0.25 2.4
  [4,1,0.56,-0.25,3.58,-0.56,-0.25,3.58,-0.33,-0.25,2.4,0.33,-0.25,2.4],
// 4 1 0.33 -0.25 2.4 -0.33 -0.25 2.4 -0.56 -0.25 1.22 0.33 -0.25 2.1
  [4,1,0.33,-0.25,2.4,-0.33,-0.25,2.4,-0.56,-0.25,1.22,0.33,-0.25,2.1],
// 4 1 1.23 -0.25 -1.78 0.33 -0.25 2.1 -0.56 -0.25 1.22 0.73 -0.25 -3.03
  [4,1,1.23,-0.25,-1.78,0.33,-0.25,2.1,-0.56,-0.25,1.22,0.73,-0.25,-3.03],
// 4 1 -1.1 -0.25 0.2 -0.65 -0.25 -2.45 0.73 -0.25 -3.03 -0.56 -0.25 1.22
  [4,1,-1.1,-0.25,0.2,-0.65,-0.25,-2.45,0.73,-0.25,-3.03,-0.56,-0.25,1.22],
// 4 1 -0.65 -0.25 -4.53 0.5 -0.25 -4.53 0.73 -0.25 -3.03 -0.65 -0.25 -2.45
  [4,1,-0.65,-0.25,-4.53,0.5,-0.25,-4.53,0.73,-0.25,-3.03,-0.65,-0.25,-2.45],
// 4 1 4.58 -0.25 5.24 9.02 -0.25 5.24 10.2 -0.25 5.47 3.4 -0.25 5.47
  [4,1,4.58,-0.25,5.24,9.02,-0.25,5.24,10.2,-0.25,5.47,3.4,-0.25,5.47],
// 4 1 9.02 -0.25 5.24 4.58 -0.25 5.24 5.57 -0.25 4.57 8.03 -0.25 4.57
  [4,1,9.02,-0.25,5.24,4.58,-0.25,5.24,5.57,-0.25,4.57,8.03,-0.25,4.57],
// 4 1 6.24 -0.25 3.58 7.36 -0.25 3.58 8.03 -0.25 4.57 5.57 -0.25 4.57
  [4,1,6.24,-0.25,3.58,7.36,-0.25,3.58,8.03,-0.25,4.57,5.57,-0.25,4.57],
// 4 1 6.47 -0.25 2.4 7.13 -0.25 2.4 7.36 -0.25 3.58 6.24 -0.25 3.58
  [4,1,6.47,-0.25,2.4,7.13,-0.25,2.4,7.36,-0.25,3.58,6.24,-0.25,3.58],
// 4 1 6.24 -0.25 1.22 7.13 -0.25 2.1 7.13 -0.25 2.4 6.47 -0.25 2.4
  [4,1,6.24,-0.25,1.22,7.13,-0.25,2.1,7.13,-0.25,2.4,6.47,-0.25,2.4],
// 4 1 8.03 -0.25 -1.78 7.13 -0.25 2.1 6.24 -0.25 1.22 7.53 -0.25 -3.03
  [4,1,8.03,-0.25,-1.78,7.13,-0.25,2.1,6.24,-0.25,1.22,7.53,-0.25,-3.03],
// 4 1 5.7 -0.25 0.2 6.15 -0.25 -2.45 7.53 -0.25 -3.03 6.24 -0.25 1.22
  [4,1,5.7,-0.25,0.2,6.15,-0.25,-2.45,7.53,-0.25,-3.03,6.24,-0.25,1.22],
// 4 1 6.15 -0.25 -4.53 7.3 -0.25 -4.53 7.53 -0.25 -3.03 6.15 -0.25 -2.45
  [4,1,6.15,-0.25,-4.53,7.3,-0.25,-4.53,7.53,-0.25,-3.03,6.15,-0.25,-2.45],
// 3 1 11.38 -.25 5.24 16.5 -.25 8 10.2 -.25 5.47
  [3,1,11.38,-.25,5.24,16.5,-.25,8,10.2,-.25,5.47],
// 4 1 18 -.25 6.5 16.5 -.25 8 11.38 -.25 5.24 12.37 -.25 4.57
  [4,1,18,-.25,6.5,16.5,-.25,8,11.38,-.25,5.24,12.37,-.25,4.57],
// 3 1 13.04 -.25 3.58 18 -.25 6.5 12.37 -.25 4.57
  [3,1,13.04,-.25,3.58,18,-.25,6.5,12.37,-.25,4.57],
// 3 1 13.27 -.25 2.4 18 -.25 6.5 13.04 -.25 3.58
  [3,1,13.27,-.25,2.4,18,-.25,6.5,13.04,-.25,3.58],
// 3 1 13.04 -.25 1.22 18 -.25 6.5 13.27 -.25 2.4
  [3,1,13.04,-.25,1.22,18,-.25,6.5,13.27,-.25,2.4],
// 4 1 12.5 -.25 .2 12.95 -.25 -2.45 18 -.25 6.5 13.04 -.25 1.22
  [4,1,12.5,-.25,.2,12.95,-.25,-2.45,18,-.25,6.5,13.04,-.25,1.22],
// 4 1 12.95 -.25 -4.53 18 -.25 -6.5 18 -.25 6.5 12.95 -.25 -2.45
  [4,1,12.95,-.25,-4.53,18,-.25,-6.5,18,-.25,6.5,12.95,-.25,-2.45],
// 3 1 10.2 -.25 5.47 16.5 -.25 8 3.4 -.25 5.47
  [3,1,10.2,-.25,5.47,16.5,-.25,8,3.4,-.25,5.47],
// 4 1 -16.5 -.25 8 -3.4 -.25 5.47 3.4 -.25 5.47 16.5 -.25 8
  [4,1,-16.5,-.25,8,-3.4,-.25,5.47,3.4,-.25,5.47,16.5,-.25,8],
// 3 1 16.5 -.25 -8 6.15 -.25 -4.53 .5 -.25 -4.53
  [3,1,16.5,-.25,-8,6.15,-.25,-4.53,.5,-.25,-4.53],
// 3 1 16.5 -.25 -8 7.3 -.25 -4.53 6.15 -.25 -4.53
  [3,1,16.5,-.25,-8,7.3,-.25,-4.53,6.15,-.25,-4.53],
// 4 1 18 -.25 -6.5 12.95 -.25 -4.53 7.3 -.25 -4.53 16.5 -.25 -8
  [4,1,18,-.25,-6.5,12.95,-.25,-4.53,7.3,-.25,-4.53,16.5,-.25,-8],
// 4 1 .5 -.25 -4.53 -.65 -.25 -4.53 -16.5 -.25 -8 16.5 -.25 -8
  [4,1,.5,-.25,-4.53,-.65,-.25,-4.53,-16.5,-.25,-8,16.5,-.25,-8],
// 4 1 -18 -.25 6.5 -18 -.25 -6.5 -16.5 -.25 -8 -16.5 -.25 8
  [4,1,-18,-.25,6.5,-18,-.25,-6.5,-16.5,-.25,-8,-16.5,-.25,8],
// 4 15 -13.14 -0.25 2.65 -11.04 -0.25 2.65 -10.98 -0.25 2.93 -12.92 -0.25 3.74
  [4,15,-13.14,-0.25,2.65,-11.04,-0.25,2.65,-10.98,-0.25,2.93,-12.92,-0.25,3.74],
// 4 15 -7.68 -0.25 3.74 -9.62 -0.25 2.93 -9.56 -0.25 2.65 -7.46 -0.25 2.65
  [4,15,-7.68,-0.25,3.74,-9.62,-0.25,2.93,-9.56,-0.25,2.65,-7.46,-0.25,2.65],
// 4 15 -9.62 -0.25 2.93 -7.68 -0.25 3.74 -8.29 -0.25 4.66 -9.78 -0.25 3.17
  [4,15,-9.62,-0.25,2.93,-7.68,-0.25,3.74,-8.29,-0.25,4.66,-9.78,-0.25,3.17],
// 4 15 -9.78 -0.25 3.17 -8.29 -0.25 4.66 -9.21 -0.25 5.27 -10.02 -0.25 3.33
  [4,15,-9.78,-0.25,3.17,-8.29,-0.25,4.66,-9.21,-0.25,5.27,-10.02,-0.25,3.33],
// 4 15 -10.02 -0.25 3.33 -9.21 -0.25 5.27 -10.3 -0.25 5.49 -10.3 -0.25 3.39
  [4,15,-10.02,-0.25,3.33,-9.21,-0.25,5.27,-10.3,-0.25,5.49,-10.3,-0.25,3.39],
// 4 15 -10.3 -0.25 3.39 -10.3 -0.25 5.49 -11.39 -0.25 5.27 -10.58 -0.25 3.33
  [4,15,-10.3,-0.25,3.39,-10.3,-0.25,5.49,-11.39,-0.25,5.27,-10.58,-0.25,3.33],
// 4 15 -12.31 -0.25 4.66 -10.82 -0.25 3.17 -10.58 -0.25 3.33 -11.39 -0.25 5.27
  [4,15,-12.31,-0.25,4.66,-10.82,-0.25,3.17,-10.58,-0.25,3.33,-11.39,-0.25,5.27],
// 4 15 -12.92 -0.25 3.74 -10.98 -0.25 2.93 -10.82 -0.25 3.17 -12.31 -0.25 4.66
  [4,15,-12.92,-0.25,3.74,-10.98,-0.25,2.93,-10.82,-0.25,3.17,-12.31,-0.25,4.66],
// 4 1 -9.62 -0.25 2.27 -9.56 -0.25 2.65 -10.98 -0.25 2.93 -11.04 -0.25 2.65
  [4,1,-9.62,-0.25,2.27,-9.56,-0.25,2.65,-10.98,-0.25,2.93,-11.04,-0.25,2.65],
// 4 1 -9.56 -0.25 2.65 -9.62 -0.25 2.93 -10.82 -0.25 3.17 -10.98 -0.25 2.93
  [4,1,-9.56,-0.25,2.65,-9.62,-0.25,2.93,-10.82,-0.25,3.17,-10.98,-0.25,2.93],
// 4 1 -10.58 -0.25 3.33 -10.82 -0.25 3.17 -9.62 -0.25 2.93 -9.78 -0.25 3.17
  [4,1,-10.58,-0.25,3.33,-10.82,-0.25,3.17,-9.62,-0.25,2.93,-9.78,-0.25,3.17],
// 4 1 -9.78 -0.25 3.17 -10.02 -0.25 3.33 -10.3 -0.25 3.39 -10.58 -0.25 3.33
  [4,1,-9.78,-0.25,3.17,-10.02,-0.25,3.33,-10.3,-0.25,3.39,-10.58,-0.25,3.33],
// 3 15 -7.46 -0.25 2.65 -9.56 -0.25 2.65 -9.62 -0.25 2.27
  [3,15,-7.46,-0.25,2.65,-9.56,-0.25,2.65,-9.62,-0.25,2.27],
// 4 15 -7.46 -0.25 2.65 -9.62 -0.25 2.27 -9.73 -0.25 1.93 -7.58 -0.25 1.76
  [4,15,-7.46,-0.25,2.65,-9.62,-0.25,2.27,-9.73,-0.25,1.93,-7.58,-0.25,1.76],
// 4 15 -7.41 -0.25 -0.52 -9.56 -0.25 -1.24 -9.5 -0.25 -1.65 -7.23 -0.25 -1.65
  [4,15,-7.41,-0.25,-0.52,-9.56,-0.25,-1.24,-9.5,-0.25,-1.65,-7.23,-0.25,-1.65],
// 4 15 -9.56 -0.25 -1.24 -7.41 -0.25 -0.52 -7.8 -0.25 0.22 -9.69 -0.25 -0.89
  [4,15,-9.56,-0.25,-1.24,-7.41,-0.25,-0.52,-7.8,-0.25,0.22,-9.69,-0.25,-0.89],
// 3 15 -9.69 -0.25 -0.89 -7.8 -0.25 0.22 -9.89 -0.25 -0.61
  [3,15,-9.69,-0.25,-0.89,-7.8,-0.25,0.22,-9.89,-0.25,-0.61],
// 4 15 -13.32 -0.25 -1.9 -13.14 -0.25 -2.83 -11.04 -0.25 -1.96 -11.1 -0.25 -1.65
  [4,15,-13.32,-0.25,-1.9,-13.14,-0.25,-2.83,-11.04,-0.25,-1.96,-11.1,-0.25,-1.65],
// 4 15 -7.46 -0.25 -2.83 -7.23 -0.25 -1.65 -9.5 -0.25 -1.65 -9.56 -0.25 -1.96
  [4,15,-7.46,-0.25,-2.83,-7.23,-0.25,-1.65,-9.5,-0.25,-1.65,-9.56,-0.25,-1.96],
// 4 15 -9.56 -0.25 -1.96 -9.74 -0.25 -2.21 -8.13 -0.25 -3.82 -7.46 -0.25 -2.83
  [4,15,-9.56,-0.25,-1.96,-9.74,-0.25,-2.21,-8.13,-0.25,-3.82,-7.46,-0.25,-2.83],
// 4 15 -9.74 -0.25 -2.21 -9.99 -0.25 -2.39 -9.12 -0.25 -4.49 -8.13 -0.25 -3.82
  [4,15,-9.74,-0.25,-2.21,-9.99,-0.25,-2.39,-9.12,-0.25,-4.49,-8.13,-0.25,-3.82],
// 4 15 -9.99 -0.25 -2.39 -10.3 -0.25 -2.45 -10.3 -0.25 -4.72 -9.12 -0.25 -4.49
  [4,15,-9.99,-0.25,-2.39,-10.3,-0.25,-2.45,-10.3,-0.25,-4.72,-9.12,-0.25,-4.49],
// 4 15 -10.3 -0.25 -2.45 -10.61 -0.25 -2.39 -11.48 -0.25 -4.49 -10.3 -0.25 -4.72
  [4,15,-10.3,-0.25,-2.45,-10.61,-0.25,-2.39,-11.48,-0.25,-4.49,-10.3,-0.25,-4.72],
// 4 15 -10.61 -0.25 -2.39 -10.86 -0.25 -2.21 -12.47 -0.25 -3.82 -11.48 -0.25 -4.49
  [4,15,-10.61,-0.25,-2.39,-10.86,-0.25,-2.21,-12.47,-0.25,-3.82,-11.48,-0.25,-4.49],
// 4 15 -10.86 -0.25 -2.21 -11.04 -0.25 -1.96 -13.14 -0.25 -2.83 -12.47 -0.25 -3.82
  [4,15,-10.86,-0.25,-2.21,-11.04,-0.25,-1.96,-13.14,-0.25,-2.83,-12.47,-0.25,-3.82],
// 4 1 -9.5 -0.25 -1.65 -11.04 -0.25 -1.96 -10.86 -0.25 -2.21 -9.56 -0.25 -1.96
  [4,1,-9.5,-0.25,-1.65,-11.04,-0.25,-1.96,-10.86,-0.25,-2.21,-9.56,-0.25,-1.96],
// 4 1 -10.61 -0.25 -2.39 -9.74 -0.25 -2.21 -9.56 -0.25 -1.96 -10.86 -0.25 -2.21
  [4,1,-10.61,-0.25,-2.39,-9.74,-0.25,-2.21,-9.56,-0.25,-1.96,-10.86,-0.25,-2.21],
// 4 1 -10.3 -0.25 -2.45 -9.99 -0.25 -2.39 -9.74 -0.25 -2.21 -10.61 -0.25 -2.39
  [4,1,-10.3,-0.25,-2.45,-9.99,-0.25,-2.39,-9.74,-0.25,-2.21,-10.61,-0.25,-2.39],
// 4 15 -7.95 -0.25 1.1 -7.58 -0.25 1.76 -9.73 -0.25 1.93 -9.92 -0.25 1.67
  [4,15,-7.95,-0.25,1.1,-7.58,-0.25,1.76,-9.73,-0.25,1.93,-9.92,-0.25,1.67],
// 4 15 -9.89 -0.25 -0.61 -9.92 -0.25 1.67 -10.2 -0.25 1.51 -10.2 -0.25 -0.45
  [4,15,-9.89,-0.25,-0.61,-9.92,-0.25,1.67,-10.2,-0.25,1.51,-10.2,-0.25,-0.45],
// 4 15 -10.2 -0.25 1.51 -10.65 -0.25 1.4 -10.65 -0.25 -0.35 -10.2 -0.25 -0.45
  [4,15,-10.2,-0.25,1.51,-10.65,-0.25,1.4,-10.65,-0.25,-0.35,-10.2,-0.25,-0.45],
// 3 15 -7.95 -0.25 1.1 -9.92 -0.25 1.67 -8.35 -0.25 0.7
  [3,15,-7.95,-0.25,1.1,-9.92,-0.25,1.67,-8.35,-0.25,0.7],
// 4 15 -9.92 -0.25 1.67 -9.89 -0.25 -0.61 -7.8 -0.25 0.22 -8.35 -0.25 0.7
  [4,15,-9.92,-0.25,1.67,-9.89,-0.25,-0.61,-7.8,-0.25,0.22,-8.35,-0.25,0.7],
// 4 1 -9.92 -0.25 1.67 -9.73 -0.25 1.93 -9.62 -0.25 2.27 -11.04 -0.25 2.65
  [4,1,-9.92,-0.25,1.67,-9.73,-0.25,1.93,-9.62,-0.25,2.27,-11.04,-0.25,2.65],
// 4 1 -9.92 -0.25 1.67 -11.04 -0.25 2.65 -10.65 -0.25 1.4 -10.2 -0.25 1.51
  [4,1,-9.92,-0.25,1.67,-11.04,-0.25,2.65,-10.65,-0.25,1.4,-10.2,-0.25,1.51],
// 4 1 -11.04 -0.25 -1.96 -9.5 -0.25 -1.65 -9.56 -0.25 -1.24 -11.1 -0.25 -1.65
  [4,1,-11.04,-0.25,-1.96,-9.5,-0.25,-1.65,-9.56,-0.25,-1.24,-11.1,-0.25,-1.65],
// 4 1 -9.89 -0.25 -0.61 -11.1 -0.25 -1.65 -9.56 -0.25 -1.24 -9.69 -0.25 -0.89
  [4,1,-9.89,-0.25,-0.61,-11.1,-0.25,-1.65,-9.56,-0.25,-1.24,-9.69,-0.25,-0.89],
// 4 1 -10.65 -0.25 -0.35 -11.1 -0.25 -1.65 -9.89 -0.25 -0.61 -10.2 -0.25 -0.45
  [4,1,-10.65,-0.25,-0.35,-11.1,-0.25,-1.65,-9.89,-0.25,-0.61,-10.2,-0.25,-0.45],
// 4 1 -10.65 -0.25 -0.35 -10.65 -0.25 1.4 -11.04 -0.25 2.65 -13.14 -0.25 2.65
  [4,1,-10.65,-0.25,-0.35,-10.65,-0.25,1.4,-11.04,-0.25,2.65,-13.14,-0.25,2.65],
// 4 1 -13.32 -0.25 -1.9 -11.1 -0.25 -1.65 -10.65 -0.25 -0.35 -13.14 -0.25 2.65
  [4,1,-13.32,-0.25,-1.9,-11.1,-0.25,-1.65,-10.65,-0.25,-0.35,-13.14,-0.25,2.65],
// 3 1 -16.5 -.25 8 -12.31 -.25 4.66 -11.39 -.25 5.27
  [3,1,-16.5,-.25,8,-12.31,-.25,4.66,-11.39,-.25,5.27],
// 3 1 -16.5 -.25 8 -11.39 -.25 5.27 -10.3 -.25 5.49
  [3,1,-16.5,-.25,8,-11.39,-.25,5.27,-10.3,-.25,5.49],
// 4 1 -3.4 -0.25 5.47 -10.3 -0.25 5.49 -9.21 -0.25 5.27 -4.58 -0.25 5.24
  [4,1,-3.4,-0.25,5.47,-10.3,-0.25,5.49,-9.21,-0.25,5.27,-4.58,-0.25,5.24],
// 4 1 -8.29 -0.25 4.66 -5.57 -0.25 4.57 -4.58 -0.25 5.24 -9.21 -0.25 5.27
  [4,1,-8.29,-0.25,4.66,-5.57,-0.25,4.57,-4.58,-0.25,5.24,-9.21,-0.25,5.27],
// 4 1 -5.57 -0.25 4.57 -8.29 -0.25 4.66 -7.68 -0.25 3.74 -6.24 -0.25 3.58
  [4,1,-5.57,-0.25,4.57,-8.29,-0.25,4.66,-7.68,-0.25,3.74,-6.24,-0.25,3.58],
// 4 1 -6.47 -0.25 2.4 -6.24 -0.25 3.58 -7.68 -0.25 3.74 -7.46 -0.25 2.65
  [4,1,-6.47,-0.25,2.4,-6.24,-0.25,3.58,-7.68,-0.25,3.74,-7.46,-0.25,2.65],
// 4 1 -7.46 -0.25 2.65 -7.58 -0.25 1.76 -6.48 -0.25 2.1 -6.47 -0.25 2.4
  [4,1,-7.46,-0.25,2.65,-7.58,-0.25,1.76,-6.48,-0.25,2.1,-6.47,-0.25,2.4],
// 3 1 -7.95 -0.25 1.1 -8.35 -0.25 0.7 -7.8 -0.25 0.22
  [3,1,-7.95,-0.25,1.1,-8.35,-0.25,0.7,-7.8,-0.25,0.22],
// 4 1 -6.48 -0.25 2.1 -7.58 -0.25 1.76 -7.95 -0.25 1.1 -7.8 -0.25 0.22
  [4,1,-6.48,-0.25,2.1,-7.58,-0.25,1.76,-7.95,-0.25,1.1,-7.8,-0.25,0.22],
// 3 1 -6.48 -0.25 2.1 -7.8 -0.25 0.22 -7.41 -0.25 -0.52
  [3,1,-6.48,-0.25,2.1,-7.8,-0.25,0.22,-7.41,-0.25,-0.52],
// 4 1 -7.41 -0.25 -0.52 -7.23 -0.25 -1.65 -6.08 -0.25 -3.03 -6.48 -0.25 2.1
  [4,1,-7.41,-0.25,-0.52,-7.23,-0.25,-1.65,-6.08,-0.25,-3.03,-6.48,-0.25,2.1],
// 3 1 -7.23 -0.25 -1.65 -7.46 -0.25 -2.83 -6.08 -0.25 -3.03
  [3,1,-7.23,-0.25,-1.65,-7.46,-0.25,-2.83,-6.08,-0.25,-3.03],
// 4 1 -8.13 -0.25 -3.82 -6.3 -0.25 -4.53 -6.08 -0.25 -3.03 -7.46 -0.25 -2.83
  [4,1,-8.13,-0.25,-3.82,-6.3,-0.25,-4.53,-6.08,-0.25,-3.03,-7.46,-0.25,-2.83],
// 3 1 -8.13 -0.25 -3.82 -9.12 -0.25 -4.49 -6.3 -0.25 -4.53
  [3,1,-8.13,-0.25,-3.82,-9.12,-0.25,-4.49,-6.3,-0.25,-4.53],
// 3 1 -12.47 -.25 -3.82 -16.5 -.25 -8 -11.48 -.25 -4.49
  [3,1,-12.47,-.25,-3.82,-16.5,-.25,-8,-11.48,-.25,-4.49],
// 3 1 -11.48 -.25 -4.49 -16.5 -.25 -8 -10.3 -.25 -4.72
  [3,1,-11.48,-.25,-4.49,-16.5,-.25,-8,-10.3,-.25,-4.72],
// 4 1 -6.3 -.25 -4.53 -9.12 -.25 -4.49 -10.3 -.25 -4.72 -16.5 -.25 -8
  [4,1,-6.3,-.25,-4.53,-9.12,-.25,-4.49,-10.3,-.25,-4.72,-16.5,-.25,-8],
// 3 1 -.65 -.25 -4.53 -6.3 -.25 -4.53 -16.5 -.25 -8
  [3,1,-.65,-.25,-4.53,-6.3,-.25,-4.53,-16.5,-.25,-8],
// 3 1 -13.14 -.25 -2.83 -16.5 -.25 -8 -12.47 -.25 -3.82
  [3,1,-13.14,-.25,-2.83,-16.5,-.25,-8,-12.47,-.25,-3.82],
// 3 1 -13.32 -.25 -1.9 -16.5 -.25 -8 -13.14 -.25 -2.83
  [3,1,-13.32,-.25,-1.9,-16.5,-.25,-8,-13.14,-.25,-2.83],
// 3 1 -16.5 -.25 8 -12.92 -.25 3.74 -12.31 -.25 4.66
  [3,1,-16.5,-.25,8,-12.92,-.25,3.74,-12.31,-.25,4.66],
// 3 1 -16.5 -.25 8 -13.14 -.25 2.65 -12.92 -.25 3.74
  [3,1,-16.5,-.25,8,-13.14,-.25,2.65,-12.92,-.25,3.74],
// 3 1 -16.5 -.25 8 -10.3 -.25 5.49 -3.4 -.25 5.47
  [3,1,-16.5,-.25,8,-10.3,-.25,5.49,-3.4,-.25,5.47],
// 4 1 -13.14 -.25 2.65 -16.5 -.25 8 -16.5 -.25 -8 -13.32 -.25 -1.9
  [4,1,-13.14,-.25,2.65,-16.5,-.25,8,-16.5,-.25,-8,-13.32,-.25,-1.9],
];
module ldraw_lib__4578235a(step=0, col=false, unit=2/5, alt=false, line=0.2, solid=!$preview)
    makepoly(ldraw_lib__4578235a(), step=step, col=col, unit=unit, alt=alt, line=line, solid=solid);
ldraw_lib__4578235a(line=0.2);
